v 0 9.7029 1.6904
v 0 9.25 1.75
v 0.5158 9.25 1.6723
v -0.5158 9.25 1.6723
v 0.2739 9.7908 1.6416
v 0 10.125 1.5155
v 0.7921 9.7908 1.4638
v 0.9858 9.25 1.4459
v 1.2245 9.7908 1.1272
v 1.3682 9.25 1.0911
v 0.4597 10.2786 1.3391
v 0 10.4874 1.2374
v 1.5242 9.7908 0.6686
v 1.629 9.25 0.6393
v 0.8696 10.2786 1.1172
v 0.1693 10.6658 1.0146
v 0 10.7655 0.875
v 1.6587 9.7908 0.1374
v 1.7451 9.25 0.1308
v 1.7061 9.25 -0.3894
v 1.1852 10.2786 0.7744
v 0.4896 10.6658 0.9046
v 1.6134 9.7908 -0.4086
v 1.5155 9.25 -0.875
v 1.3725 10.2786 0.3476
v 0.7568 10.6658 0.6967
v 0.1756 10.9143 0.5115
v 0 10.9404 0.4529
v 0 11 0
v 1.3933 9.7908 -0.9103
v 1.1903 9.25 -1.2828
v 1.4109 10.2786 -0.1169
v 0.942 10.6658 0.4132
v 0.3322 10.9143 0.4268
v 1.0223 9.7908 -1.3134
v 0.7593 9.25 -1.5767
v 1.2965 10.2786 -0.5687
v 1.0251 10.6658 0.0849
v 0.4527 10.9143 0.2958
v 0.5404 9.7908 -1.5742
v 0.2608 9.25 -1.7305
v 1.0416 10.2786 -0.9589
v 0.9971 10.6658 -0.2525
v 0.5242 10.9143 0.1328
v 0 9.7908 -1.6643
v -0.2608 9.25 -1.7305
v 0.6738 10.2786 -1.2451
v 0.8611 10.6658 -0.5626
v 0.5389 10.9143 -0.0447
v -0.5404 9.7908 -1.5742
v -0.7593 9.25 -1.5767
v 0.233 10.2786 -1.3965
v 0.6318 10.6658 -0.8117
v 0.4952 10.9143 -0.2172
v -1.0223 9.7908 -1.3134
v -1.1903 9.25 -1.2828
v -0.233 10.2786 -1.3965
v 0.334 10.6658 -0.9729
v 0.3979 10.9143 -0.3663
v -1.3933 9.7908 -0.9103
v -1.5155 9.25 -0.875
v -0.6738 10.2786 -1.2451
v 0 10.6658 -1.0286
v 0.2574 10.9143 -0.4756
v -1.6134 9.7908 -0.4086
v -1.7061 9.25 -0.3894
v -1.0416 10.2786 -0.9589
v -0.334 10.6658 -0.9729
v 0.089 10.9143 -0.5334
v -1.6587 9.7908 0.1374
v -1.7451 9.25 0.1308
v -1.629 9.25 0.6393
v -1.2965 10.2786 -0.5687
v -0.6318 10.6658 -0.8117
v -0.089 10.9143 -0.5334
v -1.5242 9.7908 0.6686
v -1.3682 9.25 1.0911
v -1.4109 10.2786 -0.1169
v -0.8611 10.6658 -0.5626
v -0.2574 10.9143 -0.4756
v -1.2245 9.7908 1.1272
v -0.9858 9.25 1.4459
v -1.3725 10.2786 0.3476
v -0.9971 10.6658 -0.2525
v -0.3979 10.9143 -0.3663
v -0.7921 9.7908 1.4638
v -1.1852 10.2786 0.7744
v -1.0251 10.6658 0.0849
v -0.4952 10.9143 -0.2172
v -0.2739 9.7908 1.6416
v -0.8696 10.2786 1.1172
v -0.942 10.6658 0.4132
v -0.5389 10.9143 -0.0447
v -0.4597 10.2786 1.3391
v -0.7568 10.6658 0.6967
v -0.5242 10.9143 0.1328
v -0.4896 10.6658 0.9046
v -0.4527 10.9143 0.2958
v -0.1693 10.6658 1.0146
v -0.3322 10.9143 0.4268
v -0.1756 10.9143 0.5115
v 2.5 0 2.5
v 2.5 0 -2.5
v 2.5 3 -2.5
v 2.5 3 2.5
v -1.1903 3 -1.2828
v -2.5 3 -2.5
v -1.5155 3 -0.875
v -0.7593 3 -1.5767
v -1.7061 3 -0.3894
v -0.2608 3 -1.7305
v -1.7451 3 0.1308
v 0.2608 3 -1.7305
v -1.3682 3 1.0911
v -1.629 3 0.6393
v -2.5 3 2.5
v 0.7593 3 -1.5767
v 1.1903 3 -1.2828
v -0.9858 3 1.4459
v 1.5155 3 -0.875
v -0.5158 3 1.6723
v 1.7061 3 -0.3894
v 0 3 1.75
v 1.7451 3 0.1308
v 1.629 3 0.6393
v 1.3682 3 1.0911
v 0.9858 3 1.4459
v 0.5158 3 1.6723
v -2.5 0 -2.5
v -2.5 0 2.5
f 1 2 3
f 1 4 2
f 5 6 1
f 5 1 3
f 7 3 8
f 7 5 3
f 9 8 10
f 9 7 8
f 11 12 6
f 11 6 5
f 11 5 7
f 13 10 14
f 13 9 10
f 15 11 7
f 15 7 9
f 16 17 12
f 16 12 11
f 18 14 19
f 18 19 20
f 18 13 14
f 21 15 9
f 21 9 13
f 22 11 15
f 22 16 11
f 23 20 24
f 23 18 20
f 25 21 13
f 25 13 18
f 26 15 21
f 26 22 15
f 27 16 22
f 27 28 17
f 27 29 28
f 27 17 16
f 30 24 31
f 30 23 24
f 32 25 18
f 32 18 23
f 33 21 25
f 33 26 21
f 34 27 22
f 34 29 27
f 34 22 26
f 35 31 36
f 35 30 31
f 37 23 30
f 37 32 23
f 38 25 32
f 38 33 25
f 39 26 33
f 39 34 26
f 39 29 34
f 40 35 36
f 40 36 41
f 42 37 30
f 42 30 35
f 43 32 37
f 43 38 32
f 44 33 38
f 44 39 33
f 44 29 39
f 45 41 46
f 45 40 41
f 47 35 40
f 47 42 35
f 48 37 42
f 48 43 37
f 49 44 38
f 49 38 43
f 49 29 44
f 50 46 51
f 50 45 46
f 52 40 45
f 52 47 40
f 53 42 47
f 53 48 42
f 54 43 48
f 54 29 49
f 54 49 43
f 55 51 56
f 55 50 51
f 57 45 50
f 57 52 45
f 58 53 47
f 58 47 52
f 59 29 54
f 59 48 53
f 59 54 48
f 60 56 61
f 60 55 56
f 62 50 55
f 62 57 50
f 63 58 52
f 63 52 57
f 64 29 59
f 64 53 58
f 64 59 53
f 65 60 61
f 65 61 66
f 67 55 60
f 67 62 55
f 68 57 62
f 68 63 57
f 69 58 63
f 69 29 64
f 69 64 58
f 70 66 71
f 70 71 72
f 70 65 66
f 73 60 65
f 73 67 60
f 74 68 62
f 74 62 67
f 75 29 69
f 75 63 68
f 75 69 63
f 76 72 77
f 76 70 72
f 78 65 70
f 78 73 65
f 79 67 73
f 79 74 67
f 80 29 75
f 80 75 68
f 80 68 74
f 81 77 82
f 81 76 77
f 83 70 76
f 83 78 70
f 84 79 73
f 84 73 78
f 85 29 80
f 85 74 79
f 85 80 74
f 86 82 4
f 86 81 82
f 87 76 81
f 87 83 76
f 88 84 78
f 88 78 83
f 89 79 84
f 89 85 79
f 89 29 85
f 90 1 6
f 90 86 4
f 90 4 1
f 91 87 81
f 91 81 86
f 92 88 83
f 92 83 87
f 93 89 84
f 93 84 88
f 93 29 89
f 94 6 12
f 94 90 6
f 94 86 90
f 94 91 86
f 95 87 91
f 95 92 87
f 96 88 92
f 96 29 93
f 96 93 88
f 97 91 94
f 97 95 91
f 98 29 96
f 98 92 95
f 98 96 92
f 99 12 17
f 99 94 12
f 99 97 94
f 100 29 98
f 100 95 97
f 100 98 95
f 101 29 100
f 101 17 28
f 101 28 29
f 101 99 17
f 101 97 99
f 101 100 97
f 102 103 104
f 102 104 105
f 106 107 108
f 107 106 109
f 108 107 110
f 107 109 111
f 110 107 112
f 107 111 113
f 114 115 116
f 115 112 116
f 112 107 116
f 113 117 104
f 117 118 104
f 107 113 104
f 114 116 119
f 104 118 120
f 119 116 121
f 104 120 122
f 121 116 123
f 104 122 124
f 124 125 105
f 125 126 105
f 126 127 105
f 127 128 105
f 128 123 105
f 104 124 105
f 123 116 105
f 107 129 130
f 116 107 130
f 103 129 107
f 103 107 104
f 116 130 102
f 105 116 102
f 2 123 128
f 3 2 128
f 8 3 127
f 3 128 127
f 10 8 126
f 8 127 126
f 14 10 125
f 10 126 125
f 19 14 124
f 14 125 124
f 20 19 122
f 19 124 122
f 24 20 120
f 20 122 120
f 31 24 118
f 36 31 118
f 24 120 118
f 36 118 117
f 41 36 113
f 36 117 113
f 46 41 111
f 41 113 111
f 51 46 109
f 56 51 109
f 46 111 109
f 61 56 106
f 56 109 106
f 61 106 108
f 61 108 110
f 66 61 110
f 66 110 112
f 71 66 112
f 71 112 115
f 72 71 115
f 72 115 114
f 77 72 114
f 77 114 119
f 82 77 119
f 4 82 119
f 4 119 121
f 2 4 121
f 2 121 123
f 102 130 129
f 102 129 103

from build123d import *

# Parameters (mm, degrees)
SKETCH1_R           = 1.75
BOSS_EXTRUDE1_DEPTH = 11
FILLET1_R           = 1.75
SKETCH3_W           = 5
SKETCH3_H           = 5
BOSS_EXTRUDE2_DEPTH = 3


with BuildPart() as part:
    # Sketch1 → Boss-Extrude1 (new body)
    with BuildSketch(Plane(origin=(0, 0, 0), x_dir=(1, 0, 0), z_dir=(0, 1, 0))):
        with Locations(Location((0, 0, 0), (0, 0, 270))):
            Circle(SKETCH1_R)
    extrude(amount=BOSS_EXTRUDE1_DEPTH)

    # Fillet1
    fillet1_edges = [part.edges().sort_by_distance(p)[0] for p in [
        (0, 11, -1.75),
    ]]
    fillet(fillet1_edges, radius=FILLET1_R)

    # Sketch3 → Boss-Extrude2 (add)
    with BuildSketch(Plane.XZ):
        Rectangle(SKETCH3_W, SKETCH3_H)
    extrude(amount=-BOSS_EXTRUDE2_DEPTH)


solid = part.part
